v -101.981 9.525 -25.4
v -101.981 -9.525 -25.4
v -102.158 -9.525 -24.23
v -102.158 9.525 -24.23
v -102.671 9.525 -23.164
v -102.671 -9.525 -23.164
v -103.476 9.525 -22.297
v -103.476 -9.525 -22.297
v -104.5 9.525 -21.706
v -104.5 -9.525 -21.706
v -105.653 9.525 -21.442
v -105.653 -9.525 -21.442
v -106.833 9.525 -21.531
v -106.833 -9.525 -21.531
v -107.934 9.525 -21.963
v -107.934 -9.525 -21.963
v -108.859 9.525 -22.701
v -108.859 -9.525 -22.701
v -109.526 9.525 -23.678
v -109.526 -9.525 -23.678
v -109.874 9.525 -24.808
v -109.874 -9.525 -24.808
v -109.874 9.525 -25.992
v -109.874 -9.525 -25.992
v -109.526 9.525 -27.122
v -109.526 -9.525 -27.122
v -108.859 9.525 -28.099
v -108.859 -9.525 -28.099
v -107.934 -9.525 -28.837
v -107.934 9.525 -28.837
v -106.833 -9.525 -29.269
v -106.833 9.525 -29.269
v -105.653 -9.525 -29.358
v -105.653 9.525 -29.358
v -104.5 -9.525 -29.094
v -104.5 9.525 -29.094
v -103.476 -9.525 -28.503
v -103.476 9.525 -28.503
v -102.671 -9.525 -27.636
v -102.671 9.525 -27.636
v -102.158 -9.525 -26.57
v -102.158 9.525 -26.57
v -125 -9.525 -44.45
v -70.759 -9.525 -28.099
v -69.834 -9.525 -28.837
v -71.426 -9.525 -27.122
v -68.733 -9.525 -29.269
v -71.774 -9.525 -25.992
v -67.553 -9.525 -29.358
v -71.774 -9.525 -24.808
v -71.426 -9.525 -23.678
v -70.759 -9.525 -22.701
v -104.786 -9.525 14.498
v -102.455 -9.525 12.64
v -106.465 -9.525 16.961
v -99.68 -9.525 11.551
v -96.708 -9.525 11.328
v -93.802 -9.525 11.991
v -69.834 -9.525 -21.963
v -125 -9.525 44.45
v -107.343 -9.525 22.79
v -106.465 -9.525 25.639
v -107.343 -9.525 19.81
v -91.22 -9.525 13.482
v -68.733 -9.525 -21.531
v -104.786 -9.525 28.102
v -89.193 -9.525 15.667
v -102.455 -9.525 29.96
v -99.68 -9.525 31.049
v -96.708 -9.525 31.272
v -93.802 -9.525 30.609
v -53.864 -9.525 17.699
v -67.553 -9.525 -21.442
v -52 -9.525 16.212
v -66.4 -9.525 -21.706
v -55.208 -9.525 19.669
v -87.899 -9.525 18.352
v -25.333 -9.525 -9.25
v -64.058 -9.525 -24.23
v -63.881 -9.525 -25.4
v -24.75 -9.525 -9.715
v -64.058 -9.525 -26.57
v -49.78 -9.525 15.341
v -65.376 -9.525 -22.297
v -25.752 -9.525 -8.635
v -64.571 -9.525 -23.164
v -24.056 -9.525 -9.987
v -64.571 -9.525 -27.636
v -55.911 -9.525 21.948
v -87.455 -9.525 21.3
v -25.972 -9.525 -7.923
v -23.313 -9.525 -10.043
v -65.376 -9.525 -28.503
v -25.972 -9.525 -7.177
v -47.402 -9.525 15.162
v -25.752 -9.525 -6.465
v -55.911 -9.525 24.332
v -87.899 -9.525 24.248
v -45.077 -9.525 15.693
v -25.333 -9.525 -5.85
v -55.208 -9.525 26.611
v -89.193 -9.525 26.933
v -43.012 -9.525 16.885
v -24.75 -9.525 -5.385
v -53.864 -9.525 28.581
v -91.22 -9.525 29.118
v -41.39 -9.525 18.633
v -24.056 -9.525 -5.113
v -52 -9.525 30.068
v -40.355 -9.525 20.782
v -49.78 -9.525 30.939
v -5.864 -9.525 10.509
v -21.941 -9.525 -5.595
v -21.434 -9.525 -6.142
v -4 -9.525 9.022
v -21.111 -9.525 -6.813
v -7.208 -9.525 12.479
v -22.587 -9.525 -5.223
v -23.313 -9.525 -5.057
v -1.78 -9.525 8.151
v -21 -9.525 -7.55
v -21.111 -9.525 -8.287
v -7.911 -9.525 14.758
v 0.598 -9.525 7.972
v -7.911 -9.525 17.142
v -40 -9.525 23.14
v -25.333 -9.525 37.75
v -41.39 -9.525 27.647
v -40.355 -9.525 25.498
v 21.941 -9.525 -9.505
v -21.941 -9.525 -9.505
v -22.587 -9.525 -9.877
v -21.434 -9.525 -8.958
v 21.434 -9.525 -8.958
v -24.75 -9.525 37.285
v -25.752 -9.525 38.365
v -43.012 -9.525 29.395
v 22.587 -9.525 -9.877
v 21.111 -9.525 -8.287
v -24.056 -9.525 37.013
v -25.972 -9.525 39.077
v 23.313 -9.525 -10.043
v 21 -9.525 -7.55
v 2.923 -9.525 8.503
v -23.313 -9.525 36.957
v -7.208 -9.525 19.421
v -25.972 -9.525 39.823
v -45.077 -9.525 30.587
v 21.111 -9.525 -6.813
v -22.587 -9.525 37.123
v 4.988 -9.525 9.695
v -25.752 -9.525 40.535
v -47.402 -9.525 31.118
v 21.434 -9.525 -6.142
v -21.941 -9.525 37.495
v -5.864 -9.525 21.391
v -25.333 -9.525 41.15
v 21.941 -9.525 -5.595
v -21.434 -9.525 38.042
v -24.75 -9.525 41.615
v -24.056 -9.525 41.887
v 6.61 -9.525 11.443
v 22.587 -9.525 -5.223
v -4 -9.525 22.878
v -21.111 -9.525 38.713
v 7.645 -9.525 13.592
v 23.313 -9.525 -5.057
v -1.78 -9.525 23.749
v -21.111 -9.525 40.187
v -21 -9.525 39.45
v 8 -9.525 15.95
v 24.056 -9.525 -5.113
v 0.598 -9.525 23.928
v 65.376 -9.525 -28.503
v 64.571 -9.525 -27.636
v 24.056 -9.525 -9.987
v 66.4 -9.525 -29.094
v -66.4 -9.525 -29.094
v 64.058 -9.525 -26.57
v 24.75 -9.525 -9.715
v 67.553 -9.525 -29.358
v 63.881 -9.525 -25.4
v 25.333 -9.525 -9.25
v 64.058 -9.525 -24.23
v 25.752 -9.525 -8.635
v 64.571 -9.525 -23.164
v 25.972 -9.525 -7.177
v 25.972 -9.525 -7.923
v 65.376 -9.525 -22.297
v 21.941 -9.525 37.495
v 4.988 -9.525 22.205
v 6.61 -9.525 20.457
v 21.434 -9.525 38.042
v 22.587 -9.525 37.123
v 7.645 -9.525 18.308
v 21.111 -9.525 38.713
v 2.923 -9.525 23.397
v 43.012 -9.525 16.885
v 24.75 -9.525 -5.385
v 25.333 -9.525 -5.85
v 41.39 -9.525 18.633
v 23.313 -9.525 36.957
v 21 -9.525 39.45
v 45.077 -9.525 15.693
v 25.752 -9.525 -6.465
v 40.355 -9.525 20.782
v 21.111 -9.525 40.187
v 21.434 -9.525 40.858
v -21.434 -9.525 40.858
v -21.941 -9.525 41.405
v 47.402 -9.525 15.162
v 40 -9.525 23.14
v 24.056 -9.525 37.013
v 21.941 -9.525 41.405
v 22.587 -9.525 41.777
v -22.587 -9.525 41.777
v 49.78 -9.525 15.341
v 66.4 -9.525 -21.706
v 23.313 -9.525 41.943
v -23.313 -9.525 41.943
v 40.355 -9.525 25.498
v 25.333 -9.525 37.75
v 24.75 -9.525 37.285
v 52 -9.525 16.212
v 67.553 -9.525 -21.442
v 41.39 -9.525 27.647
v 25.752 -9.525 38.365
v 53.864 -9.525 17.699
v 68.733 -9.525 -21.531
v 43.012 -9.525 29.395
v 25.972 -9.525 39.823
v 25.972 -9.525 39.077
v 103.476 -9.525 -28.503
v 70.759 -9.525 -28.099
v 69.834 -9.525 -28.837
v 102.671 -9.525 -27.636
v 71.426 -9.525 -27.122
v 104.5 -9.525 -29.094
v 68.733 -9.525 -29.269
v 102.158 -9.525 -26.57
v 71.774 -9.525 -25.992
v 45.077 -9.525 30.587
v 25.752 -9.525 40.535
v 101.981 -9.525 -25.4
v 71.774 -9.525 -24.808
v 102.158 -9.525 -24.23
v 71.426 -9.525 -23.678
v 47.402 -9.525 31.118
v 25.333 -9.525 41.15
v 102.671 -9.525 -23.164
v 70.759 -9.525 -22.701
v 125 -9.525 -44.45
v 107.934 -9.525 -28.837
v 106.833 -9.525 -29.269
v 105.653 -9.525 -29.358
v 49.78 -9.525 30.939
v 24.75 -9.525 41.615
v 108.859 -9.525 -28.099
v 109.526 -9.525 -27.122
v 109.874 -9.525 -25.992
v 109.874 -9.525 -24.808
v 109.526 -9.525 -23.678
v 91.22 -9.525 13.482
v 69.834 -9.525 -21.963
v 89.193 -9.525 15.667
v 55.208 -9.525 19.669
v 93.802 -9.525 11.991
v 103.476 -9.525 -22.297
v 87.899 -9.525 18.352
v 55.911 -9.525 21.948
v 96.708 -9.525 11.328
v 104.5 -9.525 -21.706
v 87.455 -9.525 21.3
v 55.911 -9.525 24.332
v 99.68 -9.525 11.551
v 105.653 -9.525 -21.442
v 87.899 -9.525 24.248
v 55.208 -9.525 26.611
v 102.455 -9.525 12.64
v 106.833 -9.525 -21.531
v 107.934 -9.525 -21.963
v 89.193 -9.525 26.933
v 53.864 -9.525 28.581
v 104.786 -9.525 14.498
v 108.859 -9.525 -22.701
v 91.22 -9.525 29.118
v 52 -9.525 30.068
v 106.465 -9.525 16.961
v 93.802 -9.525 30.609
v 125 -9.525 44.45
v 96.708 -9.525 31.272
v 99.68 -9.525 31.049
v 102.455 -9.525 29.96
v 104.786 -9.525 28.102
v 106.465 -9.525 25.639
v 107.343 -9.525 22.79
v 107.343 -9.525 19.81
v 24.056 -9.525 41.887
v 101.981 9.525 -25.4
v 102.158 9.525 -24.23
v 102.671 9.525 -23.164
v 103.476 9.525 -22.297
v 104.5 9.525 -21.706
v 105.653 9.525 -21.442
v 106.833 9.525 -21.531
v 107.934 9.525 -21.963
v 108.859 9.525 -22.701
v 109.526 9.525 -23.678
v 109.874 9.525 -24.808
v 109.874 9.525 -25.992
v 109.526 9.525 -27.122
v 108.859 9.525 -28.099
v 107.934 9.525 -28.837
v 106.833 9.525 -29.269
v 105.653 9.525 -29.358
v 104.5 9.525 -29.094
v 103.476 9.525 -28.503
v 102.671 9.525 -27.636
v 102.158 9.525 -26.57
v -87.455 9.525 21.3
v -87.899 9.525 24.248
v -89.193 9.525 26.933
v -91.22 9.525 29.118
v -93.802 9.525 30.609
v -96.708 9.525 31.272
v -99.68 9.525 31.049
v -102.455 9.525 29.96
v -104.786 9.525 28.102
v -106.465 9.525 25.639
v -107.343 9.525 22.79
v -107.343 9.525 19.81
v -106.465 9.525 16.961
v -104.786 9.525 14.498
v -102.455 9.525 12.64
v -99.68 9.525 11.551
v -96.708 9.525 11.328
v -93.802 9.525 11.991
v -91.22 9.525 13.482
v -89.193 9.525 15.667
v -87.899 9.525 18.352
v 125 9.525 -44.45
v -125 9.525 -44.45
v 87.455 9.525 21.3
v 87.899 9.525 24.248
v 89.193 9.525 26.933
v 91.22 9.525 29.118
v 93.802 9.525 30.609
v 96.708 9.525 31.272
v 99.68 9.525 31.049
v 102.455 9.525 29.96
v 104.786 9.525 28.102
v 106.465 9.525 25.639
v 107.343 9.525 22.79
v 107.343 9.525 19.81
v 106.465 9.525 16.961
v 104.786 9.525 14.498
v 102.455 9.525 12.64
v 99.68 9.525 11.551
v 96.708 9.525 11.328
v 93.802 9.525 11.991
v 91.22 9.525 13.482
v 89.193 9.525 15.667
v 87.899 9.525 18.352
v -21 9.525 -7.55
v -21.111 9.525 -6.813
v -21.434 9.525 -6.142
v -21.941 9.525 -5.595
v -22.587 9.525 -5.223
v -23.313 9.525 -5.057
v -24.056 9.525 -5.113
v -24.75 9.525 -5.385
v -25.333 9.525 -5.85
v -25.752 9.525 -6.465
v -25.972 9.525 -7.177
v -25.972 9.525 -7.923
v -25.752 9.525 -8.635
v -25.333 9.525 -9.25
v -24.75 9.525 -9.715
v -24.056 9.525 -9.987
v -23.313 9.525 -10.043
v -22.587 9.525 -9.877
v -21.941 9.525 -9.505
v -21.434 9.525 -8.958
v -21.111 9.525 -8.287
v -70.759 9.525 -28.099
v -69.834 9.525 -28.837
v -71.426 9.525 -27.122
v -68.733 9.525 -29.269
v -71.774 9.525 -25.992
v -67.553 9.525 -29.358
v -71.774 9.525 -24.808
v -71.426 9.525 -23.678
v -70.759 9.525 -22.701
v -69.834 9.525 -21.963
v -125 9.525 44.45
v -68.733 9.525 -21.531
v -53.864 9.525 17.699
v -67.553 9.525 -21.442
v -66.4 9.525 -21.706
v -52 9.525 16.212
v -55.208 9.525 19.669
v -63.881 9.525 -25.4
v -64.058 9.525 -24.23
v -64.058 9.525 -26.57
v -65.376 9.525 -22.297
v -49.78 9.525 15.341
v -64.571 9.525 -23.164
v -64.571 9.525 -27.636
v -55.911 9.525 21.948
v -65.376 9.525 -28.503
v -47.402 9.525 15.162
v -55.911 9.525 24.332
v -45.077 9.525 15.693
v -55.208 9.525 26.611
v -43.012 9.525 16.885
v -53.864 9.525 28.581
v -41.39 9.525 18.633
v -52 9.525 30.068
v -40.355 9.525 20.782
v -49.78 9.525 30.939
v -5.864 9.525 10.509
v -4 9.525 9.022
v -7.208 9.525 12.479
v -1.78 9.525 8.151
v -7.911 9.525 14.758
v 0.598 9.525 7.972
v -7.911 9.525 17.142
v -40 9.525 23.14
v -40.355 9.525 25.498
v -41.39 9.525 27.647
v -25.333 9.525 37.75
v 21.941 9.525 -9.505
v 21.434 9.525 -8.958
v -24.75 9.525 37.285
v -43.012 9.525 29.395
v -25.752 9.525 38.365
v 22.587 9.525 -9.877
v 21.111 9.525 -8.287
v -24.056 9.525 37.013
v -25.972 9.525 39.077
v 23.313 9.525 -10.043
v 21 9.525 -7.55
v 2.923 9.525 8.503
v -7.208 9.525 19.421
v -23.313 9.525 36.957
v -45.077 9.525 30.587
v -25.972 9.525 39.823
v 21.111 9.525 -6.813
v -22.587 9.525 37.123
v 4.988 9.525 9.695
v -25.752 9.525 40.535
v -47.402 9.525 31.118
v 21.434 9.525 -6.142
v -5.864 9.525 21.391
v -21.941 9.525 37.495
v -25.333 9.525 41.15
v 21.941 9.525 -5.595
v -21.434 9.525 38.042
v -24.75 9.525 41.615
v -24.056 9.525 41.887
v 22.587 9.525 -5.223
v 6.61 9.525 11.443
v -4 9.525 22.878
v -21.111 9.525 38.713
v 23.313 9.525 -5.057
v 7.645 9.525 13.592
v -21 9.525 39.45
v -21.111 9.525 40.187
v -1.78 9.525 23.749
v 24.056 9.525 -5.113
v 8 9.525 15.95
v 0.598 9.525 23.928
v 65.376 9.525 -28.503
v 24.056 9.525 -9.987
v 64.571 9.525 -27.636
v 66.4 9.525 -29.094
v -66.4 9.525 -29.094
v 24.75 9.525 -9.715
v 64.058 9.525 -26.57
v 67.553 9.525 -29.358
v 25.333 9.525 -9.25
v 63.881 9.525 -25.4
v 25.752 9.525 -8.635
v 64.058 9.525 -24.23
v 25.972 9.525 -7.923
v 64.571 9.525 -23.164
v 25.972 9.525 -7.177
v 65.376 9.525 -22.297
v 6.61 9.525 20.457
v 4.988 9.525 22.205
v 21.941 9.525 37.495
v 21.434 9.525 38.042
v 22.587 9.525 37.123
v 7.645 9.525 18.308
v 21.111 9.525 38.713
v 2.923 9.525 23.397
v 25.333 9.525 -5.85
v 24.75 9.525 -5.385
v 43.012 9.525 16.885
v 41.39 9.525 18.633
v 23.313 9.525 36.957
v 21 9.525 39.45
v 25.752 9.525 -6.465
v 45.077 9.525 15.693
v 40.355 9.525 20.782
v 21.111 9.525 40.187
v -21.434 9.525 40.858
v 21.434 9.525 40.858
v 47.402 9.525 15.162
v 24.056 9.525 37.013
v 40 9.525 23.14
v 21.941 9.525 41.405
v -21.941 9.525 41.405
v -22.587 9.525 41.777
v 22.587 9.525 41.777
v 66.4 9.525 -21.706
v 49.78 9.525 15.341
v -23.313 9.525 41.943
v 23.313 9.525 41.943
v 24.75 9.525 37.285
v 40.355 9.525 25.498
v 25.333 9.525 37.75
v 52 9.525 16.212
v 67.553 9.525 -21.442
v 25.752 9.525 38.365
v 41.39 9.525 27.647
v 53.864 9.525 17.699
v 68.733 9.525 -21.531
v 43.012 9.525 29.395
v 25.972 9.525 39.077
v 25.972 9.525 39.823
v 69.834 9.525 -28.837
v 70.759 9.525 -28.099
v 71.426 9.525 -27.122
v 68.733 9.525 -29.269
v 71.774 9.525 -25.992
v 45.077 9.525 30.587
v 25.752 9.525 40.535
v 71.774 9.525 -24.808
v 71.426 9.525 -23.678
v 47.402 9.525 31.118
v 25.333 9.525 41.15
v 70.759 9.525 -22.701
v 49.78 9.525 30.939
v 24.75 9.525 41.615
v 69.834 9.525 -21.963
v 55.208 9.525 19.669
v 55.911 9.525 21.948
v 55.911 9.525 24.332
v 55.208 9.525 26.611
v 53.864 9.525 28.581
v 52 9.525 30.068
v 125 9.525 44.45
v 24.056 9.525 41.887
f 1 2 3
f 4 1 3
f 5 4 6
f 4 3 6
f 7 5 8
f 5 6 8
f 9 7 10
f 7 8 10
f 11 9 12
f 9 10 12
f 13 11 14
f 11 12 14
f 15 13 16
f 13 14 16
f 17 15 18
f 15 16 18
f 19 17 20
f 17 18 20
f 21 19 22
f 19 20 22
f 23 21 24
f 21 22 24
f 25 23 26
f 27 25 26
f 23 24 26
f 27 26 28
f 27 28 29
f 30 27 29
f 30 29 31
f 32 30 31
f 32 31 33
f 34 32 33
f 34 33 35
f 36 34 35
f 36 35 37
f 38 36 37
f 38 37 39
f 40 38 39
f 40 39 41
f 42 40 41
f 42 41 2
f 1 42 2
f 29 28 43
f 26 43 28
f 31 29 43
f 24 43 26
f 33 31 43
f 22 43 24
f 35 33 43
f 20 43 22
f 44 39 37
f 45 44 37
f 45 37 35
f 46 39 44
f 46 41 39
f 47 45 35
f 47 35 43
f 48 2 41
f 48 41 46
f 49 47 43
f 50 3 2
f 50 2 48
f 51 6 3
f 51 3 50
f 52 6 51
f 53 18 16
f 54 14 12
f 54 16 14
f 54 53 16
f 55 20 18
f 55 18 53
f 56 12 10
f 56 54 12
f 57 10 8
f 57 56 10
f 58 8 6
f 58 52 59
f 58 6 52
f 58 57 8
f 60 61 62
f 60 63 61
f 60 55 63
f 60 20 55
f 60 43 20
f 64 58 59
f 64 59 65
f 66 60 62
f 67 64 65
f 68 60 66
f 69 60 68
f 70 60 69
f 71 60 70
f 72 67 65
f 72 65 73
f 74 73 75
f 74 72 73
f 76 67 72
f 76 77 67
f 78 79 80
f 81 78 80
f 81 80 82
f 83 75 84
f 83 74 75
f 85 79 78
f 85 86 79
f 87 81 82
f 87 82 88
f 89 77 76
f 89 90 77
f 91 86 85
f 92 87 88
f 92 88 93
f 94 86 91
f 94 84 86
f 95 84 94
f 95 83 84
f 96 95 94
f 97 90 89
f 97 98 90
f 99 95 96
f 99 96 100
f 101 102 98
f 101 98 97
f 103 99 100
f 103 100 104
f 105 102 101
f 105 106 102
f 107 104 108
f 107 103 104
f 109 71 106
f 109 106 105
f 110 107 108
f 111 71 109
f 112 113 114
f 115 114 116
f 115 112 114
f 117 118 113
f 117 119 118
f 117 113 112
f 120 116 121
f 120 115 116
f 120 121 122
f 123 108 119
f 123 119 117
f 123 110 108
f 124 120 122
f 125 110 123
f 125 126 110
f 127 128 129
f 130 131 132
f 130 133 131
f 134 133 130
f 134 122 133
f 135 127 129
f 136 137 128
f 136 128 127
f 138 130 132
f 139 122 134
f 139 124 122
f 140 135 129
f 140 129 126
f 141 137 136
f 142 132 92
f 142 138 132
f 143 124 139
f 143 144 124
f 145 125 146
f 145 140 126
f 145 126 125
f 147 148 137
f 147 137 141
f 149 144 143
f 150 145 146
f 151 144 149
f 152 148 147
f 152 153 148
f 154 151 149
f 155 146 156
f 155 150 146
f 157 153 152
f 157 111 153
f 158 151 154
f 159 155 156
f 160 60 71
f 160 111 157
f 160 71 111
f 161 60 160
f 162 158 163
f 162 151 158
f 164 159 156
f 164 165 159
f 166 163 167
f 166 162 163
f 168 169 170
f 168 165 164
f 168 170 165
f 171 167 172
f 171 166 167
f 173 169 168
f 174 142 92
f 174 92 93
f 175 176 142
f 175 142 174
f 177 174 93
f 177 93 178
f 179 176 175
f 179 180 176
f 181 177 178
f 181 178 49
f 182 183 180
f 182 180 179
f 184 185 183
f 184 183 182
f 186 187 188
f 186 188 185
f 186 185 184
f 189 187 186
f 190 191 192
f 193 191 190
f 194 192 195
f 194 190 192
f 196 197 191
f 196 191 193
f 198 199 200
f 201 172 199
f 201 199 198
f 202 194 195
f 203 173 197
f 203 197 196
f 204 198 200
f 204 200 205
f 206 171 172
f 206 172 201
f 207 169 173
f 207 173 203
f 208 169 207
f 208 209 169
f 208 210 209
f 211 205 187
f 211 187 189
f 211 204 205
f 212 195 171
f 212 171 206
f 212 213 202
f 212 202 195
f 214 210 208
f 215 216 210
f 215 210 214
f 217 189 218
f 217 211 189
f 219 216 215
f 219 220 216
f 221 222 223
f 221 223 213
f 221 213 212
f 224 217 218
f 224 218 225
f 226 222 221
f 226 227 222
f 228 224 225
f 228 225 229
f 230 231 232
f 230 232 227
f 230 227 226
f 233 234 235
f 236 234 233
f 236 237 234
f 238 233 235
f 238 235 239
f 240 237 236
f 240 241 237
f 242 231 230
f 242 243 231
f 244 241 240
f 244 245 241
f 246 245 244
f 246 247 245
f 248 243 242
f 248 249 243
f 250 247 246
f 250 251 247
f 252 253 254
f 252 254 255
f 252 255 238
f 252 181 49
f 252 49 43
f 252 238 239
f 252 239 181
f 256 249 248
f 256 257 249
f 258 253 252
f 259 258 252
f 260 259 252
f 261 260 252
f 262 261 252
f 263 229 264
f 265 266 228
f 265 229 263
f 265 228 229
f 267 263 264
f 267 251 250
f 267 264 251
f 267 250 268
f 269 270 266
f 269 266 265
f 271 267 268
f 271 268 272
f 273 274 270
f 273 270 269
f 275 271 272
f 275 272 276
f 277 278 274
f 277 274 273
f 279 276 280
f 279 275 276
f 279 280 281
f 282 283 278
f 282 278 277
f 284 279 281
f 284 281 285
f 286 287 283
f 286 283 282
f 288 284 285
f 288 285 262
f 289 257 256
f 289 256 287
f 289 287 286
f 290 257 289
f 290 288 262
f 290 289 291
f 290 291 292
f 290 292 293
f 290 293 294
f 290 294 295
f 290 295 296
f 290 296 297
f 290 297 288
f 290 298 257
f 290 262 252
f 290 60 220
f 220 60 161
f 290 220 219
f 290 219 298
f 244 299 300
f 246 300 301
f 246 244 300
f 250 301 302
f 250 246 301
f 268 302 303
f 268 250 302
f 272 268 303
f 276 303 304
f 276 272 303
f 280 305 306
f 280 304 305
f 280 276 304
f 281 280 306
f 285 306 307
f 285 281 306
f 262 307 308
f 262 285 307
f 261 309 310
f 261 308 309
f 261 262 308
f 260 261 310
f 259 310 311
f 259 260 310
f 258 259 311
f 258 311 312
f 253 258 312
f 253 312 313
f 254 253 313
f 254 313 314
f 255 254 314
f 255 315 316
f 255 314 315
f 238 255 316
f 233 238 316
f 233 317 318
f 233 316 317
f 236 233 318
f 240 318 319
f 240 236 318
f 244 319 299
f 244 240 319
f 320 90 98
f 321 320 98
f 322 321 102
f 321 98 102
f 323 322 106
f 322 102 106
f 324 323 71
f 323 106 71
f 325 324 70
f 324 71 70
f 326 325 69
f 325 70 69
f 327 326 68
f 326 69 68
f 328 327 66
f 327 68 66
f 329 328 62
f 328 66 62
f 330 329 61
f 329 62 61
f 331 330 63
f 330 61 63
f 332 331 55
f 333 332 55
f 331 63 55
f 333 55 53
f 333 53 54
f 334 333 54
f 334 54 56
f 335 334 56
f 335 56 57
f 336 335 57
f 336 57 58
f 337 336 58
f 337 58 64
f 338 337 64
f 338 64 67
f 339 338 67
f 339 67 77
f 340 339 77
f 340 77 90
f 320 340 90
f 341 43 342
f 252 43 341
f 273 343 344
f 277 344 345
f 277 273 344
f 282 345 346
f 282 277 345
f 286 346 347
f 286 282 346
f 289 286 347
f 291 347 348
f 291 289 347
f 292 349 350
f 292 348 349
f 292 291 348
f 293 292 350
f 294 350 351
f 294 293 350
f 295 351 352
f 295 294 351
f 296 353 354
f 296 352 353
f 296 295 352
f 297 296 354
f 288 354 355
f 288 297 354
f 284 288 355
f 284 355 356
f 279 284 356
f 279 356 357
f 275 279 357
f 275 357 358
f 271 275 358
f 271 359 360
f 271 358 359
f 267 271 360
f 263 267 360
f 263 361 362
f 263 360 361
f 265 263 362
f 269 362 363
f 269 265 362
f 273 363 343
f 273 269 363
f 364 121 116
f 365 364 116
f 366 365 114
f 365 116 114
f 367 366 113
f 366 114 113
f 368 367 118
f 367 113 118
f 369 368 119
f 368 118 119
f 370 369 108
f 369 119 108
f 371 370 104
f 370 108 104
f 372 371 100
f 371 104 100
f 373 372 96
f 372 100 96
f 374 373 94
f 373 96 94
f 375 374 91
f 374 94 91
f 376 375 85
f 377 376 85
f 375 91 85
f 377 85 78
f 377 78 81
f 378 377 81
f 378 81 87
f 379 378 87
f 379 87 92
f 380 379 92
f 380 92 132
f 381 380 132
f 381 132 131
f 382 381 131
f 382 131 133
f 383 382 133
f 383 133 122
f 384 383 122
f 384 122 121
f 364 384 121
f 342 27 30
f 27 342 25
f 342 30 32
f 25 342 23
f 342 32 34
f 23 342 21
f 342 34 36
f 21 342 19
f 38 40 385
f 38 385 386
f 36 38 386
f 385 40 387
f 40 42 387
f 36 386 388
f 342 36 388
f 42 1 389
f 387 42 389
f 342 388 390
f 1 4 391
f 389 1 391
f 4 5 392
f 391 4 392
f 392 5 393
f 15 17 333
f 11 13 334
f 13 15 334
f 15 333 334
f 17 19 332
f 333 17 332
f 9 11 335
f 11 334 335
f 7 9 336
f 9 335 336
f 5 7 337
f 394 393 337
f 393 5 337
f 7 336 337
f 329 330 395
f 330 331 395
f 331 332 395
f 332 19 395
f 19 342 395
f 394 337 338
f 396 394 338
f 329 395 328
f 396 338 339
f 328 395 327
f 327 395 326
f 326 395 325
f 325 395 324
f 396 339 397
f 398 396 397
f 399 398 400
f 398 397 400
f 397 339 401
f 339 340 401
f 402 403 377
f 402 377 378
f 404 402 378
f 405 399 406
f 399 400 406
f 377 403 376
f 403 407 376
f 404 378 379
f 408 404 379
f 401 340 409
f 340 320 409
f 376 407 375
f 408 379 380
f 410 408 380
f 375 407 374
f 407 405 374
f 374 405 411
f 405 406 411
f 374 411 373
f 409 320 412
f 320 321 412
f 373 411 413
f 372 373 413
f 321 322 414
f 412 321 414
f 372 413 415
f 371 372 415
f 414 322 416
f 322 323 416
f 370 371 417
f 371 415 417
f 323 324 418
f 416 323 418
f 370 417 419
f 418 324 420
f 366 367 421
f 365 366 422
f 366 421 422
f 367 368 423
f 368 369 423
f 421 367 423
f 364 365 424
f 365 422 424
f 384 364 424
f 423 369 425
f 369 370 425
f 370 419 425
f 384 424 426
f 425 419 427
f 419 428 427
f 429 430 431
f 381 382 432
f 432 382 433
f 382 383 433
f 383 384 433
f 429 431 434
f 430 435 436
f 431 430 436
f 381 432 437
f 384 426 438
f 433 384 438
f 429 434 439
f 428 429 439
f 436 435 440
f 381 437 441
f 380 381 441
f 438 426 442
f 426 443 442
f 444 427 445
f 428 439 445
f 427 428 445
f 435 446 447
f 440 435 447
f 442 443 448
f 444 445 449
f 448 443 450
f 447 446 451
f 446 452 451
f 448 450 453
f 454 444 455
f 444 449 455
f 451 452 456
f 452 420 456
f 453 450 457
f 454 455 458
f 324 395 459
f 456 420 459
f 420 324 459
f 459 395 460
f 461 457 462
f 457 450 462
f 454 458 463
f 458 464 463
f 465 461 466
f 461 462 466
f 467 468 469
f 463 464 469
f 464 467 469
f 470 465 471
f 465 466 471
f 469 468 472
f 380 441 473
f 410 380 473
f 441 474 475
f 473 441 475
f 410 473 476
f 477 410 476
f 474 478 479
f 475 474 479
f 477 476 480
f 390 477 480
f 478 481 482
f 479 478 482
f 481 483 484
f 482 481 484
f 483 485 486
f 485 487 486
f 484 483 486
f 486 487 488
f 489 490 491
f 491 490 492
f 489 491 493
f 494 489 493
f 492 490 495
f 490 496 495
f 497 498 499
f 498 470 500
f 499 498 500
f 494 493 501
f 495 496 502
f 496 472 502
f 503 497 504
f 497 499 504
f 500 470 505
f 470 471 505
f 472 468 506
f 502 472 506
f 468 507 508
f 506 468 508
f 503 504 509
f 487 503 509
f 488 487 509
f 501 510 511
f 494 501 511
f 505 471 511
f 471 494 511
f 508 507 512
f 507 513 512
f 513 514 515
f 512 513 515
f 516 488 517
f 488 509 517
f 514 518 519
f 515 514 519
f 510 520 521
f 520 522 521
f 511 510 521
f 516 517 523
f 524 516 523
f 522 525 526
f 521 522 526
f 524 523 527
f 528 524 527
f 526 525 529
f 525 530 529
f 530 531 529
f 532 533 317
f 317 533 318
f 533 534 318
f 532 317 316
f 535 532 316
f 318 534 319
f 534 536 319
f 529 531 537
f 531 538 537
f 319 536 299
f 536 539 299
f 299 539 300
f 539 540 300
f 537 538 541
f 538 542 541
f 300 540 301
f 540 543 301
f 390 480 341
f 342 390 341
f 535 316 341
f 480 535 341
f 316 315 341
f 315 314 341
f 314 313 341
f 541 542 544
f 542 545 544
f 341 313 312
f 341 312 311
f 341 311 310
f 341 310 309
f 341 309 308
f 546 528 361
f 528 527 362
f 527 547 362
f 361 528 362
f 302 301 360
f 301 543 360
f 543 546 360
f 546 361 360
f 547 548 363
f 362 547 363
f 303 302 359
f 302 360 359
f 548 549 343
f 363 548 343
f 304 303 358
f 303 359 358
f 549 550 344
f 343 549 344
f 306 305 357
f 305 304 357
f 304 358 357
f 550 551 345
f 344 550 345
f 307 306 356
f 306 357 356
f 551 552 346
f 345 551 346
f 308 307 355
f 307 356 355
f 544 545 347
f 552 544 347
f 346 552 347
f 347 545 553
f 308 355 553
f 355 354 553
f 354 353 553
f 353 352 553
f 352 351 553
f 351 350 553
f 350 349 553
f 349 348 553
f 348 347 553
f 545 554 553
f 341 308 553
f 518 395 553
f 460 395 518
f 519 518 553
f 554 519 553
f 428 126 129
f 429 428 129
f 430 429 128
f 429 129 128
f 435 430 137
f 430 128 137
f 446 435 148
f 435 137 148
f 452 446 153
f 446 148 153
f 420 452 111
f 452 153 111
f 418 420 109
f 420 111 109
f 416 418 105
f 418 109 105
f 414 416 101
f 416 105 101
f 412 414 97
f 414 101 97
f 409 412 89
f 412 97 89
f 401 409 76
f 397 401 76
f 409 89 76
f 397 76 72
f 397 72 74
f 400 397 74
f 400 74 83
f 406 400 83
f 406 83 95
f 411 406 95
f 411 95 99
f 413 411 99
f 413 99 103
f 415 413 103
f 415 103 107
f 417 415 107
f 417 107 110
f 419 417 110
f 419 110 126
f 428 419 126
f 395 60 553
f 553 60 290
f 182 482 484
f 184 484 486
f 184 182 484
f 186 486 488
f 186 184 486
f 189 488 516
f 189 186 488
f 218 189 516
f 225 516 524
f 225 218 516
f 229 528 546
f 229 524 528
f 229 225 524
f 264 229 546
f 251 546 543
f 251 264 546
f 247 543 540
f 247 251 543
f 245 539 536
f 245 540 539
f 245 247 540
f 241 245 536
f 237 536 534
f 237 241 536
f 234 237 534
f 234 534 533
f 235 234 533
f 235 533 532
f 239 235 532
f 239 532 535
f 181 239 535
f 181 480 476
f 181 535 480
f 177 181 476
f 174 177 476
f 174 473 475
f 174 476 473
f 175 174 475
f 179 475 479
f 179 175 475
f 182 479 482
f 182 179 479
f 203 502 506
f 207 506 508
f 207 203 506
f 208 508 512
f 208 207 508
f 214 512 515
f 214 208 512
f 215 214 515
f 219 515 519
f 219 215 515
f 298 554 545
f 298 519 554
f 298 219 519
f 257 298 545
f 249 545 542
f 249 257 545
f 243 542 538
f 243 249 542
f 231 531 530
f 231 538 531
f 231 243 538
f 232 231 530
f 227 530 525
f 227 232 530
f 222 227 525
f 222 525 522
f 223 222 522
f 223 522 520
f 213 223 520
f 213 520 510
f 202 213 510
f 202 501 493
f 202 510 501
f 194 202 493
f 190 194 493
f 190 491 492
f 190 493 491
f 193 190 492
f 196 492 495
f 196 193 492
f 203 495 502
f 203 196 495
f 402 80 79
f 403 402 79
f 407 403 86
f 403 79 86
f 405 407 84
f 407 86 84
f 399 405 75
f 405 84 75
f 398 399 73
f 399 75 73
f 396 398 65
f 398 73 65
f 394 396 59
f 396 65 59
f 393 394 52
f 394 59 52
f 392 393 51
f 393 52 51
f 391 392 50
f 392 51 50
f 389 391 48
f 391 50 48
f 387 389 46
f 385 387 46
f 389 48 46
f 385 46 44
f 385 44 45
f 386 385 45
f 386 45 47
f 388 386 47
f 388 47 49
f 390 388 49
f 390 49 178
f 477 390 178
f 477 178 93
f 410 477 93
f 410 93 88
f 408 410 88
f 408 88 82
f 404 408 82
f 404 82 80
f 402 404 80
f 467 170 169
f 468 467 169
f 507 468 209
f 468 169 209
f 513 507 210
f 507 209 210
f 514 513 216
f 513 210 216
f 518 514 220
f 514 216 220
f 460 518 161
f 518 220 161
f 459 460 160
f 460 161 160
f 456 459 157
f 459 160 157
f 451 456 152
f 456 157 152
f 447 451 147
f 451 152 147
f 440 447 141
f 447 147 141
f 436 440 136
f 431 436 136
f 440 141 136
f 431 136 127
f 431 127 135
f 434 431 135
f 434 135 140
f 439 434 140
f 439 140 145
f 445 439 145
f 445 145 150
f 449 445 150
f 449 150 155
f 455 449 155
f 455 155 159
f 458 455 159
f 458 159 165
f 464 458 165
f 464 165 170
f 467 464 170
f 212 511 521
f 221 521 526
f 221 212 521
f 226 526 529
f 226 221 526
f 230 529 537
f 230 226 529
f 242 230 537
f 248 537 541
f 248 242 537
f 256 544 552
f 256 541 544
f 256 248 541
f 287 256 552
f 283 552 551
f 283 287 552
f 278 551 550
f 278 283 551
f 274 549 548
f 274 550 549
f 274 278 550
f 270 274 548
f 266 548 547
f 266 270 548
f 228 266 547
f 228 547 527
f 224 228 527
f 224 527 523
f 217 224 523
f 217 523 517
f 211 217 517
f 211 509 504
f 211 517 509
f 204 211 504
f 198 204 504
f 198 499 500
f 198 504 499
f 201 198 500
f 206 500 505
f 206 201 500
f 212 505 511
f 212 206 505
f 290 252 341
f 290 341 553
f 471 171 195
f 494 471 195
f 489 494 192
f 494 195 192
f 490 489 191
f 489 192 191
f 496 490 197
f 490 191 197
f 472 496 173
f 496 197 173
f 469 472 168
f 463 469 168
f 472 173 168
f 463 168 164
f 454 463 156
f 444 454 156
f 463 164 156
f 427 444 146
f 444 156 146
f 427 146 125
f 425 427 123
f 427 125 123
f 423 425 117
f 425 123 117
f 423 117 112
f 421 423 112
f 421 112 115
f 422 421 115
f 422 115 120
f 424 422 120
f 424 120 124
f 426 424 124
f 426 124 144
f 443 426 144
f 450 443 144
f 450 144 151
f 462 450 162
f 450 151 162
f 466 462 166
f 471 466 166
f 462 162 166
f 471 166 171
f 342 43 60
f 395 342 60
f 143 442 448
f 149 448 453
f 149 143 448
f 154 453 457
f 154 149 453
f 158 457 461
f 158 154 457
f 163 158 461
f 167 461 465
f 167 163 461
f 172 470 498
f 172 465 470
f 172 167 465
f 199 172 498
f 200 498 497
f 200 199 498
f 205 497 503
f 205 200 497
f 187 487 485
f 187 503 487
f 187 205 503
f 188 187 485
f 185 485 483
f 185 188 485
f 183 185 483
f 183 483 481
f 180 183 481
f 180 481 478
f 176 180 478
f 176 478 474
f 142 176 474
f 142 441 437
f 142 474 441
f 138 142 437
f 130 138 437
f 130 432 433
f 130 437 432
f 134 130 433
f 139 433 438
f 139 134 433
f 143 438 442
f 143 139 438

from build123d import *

# Parameters (mm, degrees)
F0_W     = 250
F0_H     = 88.9
F1_DEPTH = 9.525
F2_R     = 8
F2_R_2   = 2.5
F2_R_3   = 10
F2_R_4   = 3.96875
F3_DEPTH = 25.4


# Not quite as in the source:
# - a pattern or mirror of a feature is missing from the dataset's text; its kind, count and spacing are read off the source's solid


with BuildPart() as f1:
    # F0 (on Front) → F1 (new body, symmetric)
    with BuildSketch(Plane.XZ):
        Rectangle(F0_W, F0_H)
    extrude(amount=F1_DEPTH, both=True)

    # F2 (on face) → F3 (cut)
    with BuildSketch(Plane.XZ.offset(9.525)):
        with Locations((-48, 23.14)):
            Circle(F2_R)
        with Locations((0, 15.95)):
            Circle(F2_R)
        with Locations((-23.5, -7.55)):
            Circle(F2_R_2)
        with Locations((-23.5, 39.45)):
            Circle(F2_R_2)
        with Locations((-97.455, 21.3)):
            Circle(F2_R_3)
        with Locations((-67.85, -25.4)):
            Circle(F2_R_4)
        with Locations((-105.95, -25.4)):
            Circle(F2_R_4)
    f3 = extrude(amount=-F3_DEPTH, mode=Mode.SUBTRACT)

    # F3_copies: F3 across plane
    add(f3.mirror(Plane(origin=(0, 0, 0), x_dir=(0, 0, 1), z_dir=(1, 0, 0))), mode=Mode.SUBTRACT)


solid = f1.part
